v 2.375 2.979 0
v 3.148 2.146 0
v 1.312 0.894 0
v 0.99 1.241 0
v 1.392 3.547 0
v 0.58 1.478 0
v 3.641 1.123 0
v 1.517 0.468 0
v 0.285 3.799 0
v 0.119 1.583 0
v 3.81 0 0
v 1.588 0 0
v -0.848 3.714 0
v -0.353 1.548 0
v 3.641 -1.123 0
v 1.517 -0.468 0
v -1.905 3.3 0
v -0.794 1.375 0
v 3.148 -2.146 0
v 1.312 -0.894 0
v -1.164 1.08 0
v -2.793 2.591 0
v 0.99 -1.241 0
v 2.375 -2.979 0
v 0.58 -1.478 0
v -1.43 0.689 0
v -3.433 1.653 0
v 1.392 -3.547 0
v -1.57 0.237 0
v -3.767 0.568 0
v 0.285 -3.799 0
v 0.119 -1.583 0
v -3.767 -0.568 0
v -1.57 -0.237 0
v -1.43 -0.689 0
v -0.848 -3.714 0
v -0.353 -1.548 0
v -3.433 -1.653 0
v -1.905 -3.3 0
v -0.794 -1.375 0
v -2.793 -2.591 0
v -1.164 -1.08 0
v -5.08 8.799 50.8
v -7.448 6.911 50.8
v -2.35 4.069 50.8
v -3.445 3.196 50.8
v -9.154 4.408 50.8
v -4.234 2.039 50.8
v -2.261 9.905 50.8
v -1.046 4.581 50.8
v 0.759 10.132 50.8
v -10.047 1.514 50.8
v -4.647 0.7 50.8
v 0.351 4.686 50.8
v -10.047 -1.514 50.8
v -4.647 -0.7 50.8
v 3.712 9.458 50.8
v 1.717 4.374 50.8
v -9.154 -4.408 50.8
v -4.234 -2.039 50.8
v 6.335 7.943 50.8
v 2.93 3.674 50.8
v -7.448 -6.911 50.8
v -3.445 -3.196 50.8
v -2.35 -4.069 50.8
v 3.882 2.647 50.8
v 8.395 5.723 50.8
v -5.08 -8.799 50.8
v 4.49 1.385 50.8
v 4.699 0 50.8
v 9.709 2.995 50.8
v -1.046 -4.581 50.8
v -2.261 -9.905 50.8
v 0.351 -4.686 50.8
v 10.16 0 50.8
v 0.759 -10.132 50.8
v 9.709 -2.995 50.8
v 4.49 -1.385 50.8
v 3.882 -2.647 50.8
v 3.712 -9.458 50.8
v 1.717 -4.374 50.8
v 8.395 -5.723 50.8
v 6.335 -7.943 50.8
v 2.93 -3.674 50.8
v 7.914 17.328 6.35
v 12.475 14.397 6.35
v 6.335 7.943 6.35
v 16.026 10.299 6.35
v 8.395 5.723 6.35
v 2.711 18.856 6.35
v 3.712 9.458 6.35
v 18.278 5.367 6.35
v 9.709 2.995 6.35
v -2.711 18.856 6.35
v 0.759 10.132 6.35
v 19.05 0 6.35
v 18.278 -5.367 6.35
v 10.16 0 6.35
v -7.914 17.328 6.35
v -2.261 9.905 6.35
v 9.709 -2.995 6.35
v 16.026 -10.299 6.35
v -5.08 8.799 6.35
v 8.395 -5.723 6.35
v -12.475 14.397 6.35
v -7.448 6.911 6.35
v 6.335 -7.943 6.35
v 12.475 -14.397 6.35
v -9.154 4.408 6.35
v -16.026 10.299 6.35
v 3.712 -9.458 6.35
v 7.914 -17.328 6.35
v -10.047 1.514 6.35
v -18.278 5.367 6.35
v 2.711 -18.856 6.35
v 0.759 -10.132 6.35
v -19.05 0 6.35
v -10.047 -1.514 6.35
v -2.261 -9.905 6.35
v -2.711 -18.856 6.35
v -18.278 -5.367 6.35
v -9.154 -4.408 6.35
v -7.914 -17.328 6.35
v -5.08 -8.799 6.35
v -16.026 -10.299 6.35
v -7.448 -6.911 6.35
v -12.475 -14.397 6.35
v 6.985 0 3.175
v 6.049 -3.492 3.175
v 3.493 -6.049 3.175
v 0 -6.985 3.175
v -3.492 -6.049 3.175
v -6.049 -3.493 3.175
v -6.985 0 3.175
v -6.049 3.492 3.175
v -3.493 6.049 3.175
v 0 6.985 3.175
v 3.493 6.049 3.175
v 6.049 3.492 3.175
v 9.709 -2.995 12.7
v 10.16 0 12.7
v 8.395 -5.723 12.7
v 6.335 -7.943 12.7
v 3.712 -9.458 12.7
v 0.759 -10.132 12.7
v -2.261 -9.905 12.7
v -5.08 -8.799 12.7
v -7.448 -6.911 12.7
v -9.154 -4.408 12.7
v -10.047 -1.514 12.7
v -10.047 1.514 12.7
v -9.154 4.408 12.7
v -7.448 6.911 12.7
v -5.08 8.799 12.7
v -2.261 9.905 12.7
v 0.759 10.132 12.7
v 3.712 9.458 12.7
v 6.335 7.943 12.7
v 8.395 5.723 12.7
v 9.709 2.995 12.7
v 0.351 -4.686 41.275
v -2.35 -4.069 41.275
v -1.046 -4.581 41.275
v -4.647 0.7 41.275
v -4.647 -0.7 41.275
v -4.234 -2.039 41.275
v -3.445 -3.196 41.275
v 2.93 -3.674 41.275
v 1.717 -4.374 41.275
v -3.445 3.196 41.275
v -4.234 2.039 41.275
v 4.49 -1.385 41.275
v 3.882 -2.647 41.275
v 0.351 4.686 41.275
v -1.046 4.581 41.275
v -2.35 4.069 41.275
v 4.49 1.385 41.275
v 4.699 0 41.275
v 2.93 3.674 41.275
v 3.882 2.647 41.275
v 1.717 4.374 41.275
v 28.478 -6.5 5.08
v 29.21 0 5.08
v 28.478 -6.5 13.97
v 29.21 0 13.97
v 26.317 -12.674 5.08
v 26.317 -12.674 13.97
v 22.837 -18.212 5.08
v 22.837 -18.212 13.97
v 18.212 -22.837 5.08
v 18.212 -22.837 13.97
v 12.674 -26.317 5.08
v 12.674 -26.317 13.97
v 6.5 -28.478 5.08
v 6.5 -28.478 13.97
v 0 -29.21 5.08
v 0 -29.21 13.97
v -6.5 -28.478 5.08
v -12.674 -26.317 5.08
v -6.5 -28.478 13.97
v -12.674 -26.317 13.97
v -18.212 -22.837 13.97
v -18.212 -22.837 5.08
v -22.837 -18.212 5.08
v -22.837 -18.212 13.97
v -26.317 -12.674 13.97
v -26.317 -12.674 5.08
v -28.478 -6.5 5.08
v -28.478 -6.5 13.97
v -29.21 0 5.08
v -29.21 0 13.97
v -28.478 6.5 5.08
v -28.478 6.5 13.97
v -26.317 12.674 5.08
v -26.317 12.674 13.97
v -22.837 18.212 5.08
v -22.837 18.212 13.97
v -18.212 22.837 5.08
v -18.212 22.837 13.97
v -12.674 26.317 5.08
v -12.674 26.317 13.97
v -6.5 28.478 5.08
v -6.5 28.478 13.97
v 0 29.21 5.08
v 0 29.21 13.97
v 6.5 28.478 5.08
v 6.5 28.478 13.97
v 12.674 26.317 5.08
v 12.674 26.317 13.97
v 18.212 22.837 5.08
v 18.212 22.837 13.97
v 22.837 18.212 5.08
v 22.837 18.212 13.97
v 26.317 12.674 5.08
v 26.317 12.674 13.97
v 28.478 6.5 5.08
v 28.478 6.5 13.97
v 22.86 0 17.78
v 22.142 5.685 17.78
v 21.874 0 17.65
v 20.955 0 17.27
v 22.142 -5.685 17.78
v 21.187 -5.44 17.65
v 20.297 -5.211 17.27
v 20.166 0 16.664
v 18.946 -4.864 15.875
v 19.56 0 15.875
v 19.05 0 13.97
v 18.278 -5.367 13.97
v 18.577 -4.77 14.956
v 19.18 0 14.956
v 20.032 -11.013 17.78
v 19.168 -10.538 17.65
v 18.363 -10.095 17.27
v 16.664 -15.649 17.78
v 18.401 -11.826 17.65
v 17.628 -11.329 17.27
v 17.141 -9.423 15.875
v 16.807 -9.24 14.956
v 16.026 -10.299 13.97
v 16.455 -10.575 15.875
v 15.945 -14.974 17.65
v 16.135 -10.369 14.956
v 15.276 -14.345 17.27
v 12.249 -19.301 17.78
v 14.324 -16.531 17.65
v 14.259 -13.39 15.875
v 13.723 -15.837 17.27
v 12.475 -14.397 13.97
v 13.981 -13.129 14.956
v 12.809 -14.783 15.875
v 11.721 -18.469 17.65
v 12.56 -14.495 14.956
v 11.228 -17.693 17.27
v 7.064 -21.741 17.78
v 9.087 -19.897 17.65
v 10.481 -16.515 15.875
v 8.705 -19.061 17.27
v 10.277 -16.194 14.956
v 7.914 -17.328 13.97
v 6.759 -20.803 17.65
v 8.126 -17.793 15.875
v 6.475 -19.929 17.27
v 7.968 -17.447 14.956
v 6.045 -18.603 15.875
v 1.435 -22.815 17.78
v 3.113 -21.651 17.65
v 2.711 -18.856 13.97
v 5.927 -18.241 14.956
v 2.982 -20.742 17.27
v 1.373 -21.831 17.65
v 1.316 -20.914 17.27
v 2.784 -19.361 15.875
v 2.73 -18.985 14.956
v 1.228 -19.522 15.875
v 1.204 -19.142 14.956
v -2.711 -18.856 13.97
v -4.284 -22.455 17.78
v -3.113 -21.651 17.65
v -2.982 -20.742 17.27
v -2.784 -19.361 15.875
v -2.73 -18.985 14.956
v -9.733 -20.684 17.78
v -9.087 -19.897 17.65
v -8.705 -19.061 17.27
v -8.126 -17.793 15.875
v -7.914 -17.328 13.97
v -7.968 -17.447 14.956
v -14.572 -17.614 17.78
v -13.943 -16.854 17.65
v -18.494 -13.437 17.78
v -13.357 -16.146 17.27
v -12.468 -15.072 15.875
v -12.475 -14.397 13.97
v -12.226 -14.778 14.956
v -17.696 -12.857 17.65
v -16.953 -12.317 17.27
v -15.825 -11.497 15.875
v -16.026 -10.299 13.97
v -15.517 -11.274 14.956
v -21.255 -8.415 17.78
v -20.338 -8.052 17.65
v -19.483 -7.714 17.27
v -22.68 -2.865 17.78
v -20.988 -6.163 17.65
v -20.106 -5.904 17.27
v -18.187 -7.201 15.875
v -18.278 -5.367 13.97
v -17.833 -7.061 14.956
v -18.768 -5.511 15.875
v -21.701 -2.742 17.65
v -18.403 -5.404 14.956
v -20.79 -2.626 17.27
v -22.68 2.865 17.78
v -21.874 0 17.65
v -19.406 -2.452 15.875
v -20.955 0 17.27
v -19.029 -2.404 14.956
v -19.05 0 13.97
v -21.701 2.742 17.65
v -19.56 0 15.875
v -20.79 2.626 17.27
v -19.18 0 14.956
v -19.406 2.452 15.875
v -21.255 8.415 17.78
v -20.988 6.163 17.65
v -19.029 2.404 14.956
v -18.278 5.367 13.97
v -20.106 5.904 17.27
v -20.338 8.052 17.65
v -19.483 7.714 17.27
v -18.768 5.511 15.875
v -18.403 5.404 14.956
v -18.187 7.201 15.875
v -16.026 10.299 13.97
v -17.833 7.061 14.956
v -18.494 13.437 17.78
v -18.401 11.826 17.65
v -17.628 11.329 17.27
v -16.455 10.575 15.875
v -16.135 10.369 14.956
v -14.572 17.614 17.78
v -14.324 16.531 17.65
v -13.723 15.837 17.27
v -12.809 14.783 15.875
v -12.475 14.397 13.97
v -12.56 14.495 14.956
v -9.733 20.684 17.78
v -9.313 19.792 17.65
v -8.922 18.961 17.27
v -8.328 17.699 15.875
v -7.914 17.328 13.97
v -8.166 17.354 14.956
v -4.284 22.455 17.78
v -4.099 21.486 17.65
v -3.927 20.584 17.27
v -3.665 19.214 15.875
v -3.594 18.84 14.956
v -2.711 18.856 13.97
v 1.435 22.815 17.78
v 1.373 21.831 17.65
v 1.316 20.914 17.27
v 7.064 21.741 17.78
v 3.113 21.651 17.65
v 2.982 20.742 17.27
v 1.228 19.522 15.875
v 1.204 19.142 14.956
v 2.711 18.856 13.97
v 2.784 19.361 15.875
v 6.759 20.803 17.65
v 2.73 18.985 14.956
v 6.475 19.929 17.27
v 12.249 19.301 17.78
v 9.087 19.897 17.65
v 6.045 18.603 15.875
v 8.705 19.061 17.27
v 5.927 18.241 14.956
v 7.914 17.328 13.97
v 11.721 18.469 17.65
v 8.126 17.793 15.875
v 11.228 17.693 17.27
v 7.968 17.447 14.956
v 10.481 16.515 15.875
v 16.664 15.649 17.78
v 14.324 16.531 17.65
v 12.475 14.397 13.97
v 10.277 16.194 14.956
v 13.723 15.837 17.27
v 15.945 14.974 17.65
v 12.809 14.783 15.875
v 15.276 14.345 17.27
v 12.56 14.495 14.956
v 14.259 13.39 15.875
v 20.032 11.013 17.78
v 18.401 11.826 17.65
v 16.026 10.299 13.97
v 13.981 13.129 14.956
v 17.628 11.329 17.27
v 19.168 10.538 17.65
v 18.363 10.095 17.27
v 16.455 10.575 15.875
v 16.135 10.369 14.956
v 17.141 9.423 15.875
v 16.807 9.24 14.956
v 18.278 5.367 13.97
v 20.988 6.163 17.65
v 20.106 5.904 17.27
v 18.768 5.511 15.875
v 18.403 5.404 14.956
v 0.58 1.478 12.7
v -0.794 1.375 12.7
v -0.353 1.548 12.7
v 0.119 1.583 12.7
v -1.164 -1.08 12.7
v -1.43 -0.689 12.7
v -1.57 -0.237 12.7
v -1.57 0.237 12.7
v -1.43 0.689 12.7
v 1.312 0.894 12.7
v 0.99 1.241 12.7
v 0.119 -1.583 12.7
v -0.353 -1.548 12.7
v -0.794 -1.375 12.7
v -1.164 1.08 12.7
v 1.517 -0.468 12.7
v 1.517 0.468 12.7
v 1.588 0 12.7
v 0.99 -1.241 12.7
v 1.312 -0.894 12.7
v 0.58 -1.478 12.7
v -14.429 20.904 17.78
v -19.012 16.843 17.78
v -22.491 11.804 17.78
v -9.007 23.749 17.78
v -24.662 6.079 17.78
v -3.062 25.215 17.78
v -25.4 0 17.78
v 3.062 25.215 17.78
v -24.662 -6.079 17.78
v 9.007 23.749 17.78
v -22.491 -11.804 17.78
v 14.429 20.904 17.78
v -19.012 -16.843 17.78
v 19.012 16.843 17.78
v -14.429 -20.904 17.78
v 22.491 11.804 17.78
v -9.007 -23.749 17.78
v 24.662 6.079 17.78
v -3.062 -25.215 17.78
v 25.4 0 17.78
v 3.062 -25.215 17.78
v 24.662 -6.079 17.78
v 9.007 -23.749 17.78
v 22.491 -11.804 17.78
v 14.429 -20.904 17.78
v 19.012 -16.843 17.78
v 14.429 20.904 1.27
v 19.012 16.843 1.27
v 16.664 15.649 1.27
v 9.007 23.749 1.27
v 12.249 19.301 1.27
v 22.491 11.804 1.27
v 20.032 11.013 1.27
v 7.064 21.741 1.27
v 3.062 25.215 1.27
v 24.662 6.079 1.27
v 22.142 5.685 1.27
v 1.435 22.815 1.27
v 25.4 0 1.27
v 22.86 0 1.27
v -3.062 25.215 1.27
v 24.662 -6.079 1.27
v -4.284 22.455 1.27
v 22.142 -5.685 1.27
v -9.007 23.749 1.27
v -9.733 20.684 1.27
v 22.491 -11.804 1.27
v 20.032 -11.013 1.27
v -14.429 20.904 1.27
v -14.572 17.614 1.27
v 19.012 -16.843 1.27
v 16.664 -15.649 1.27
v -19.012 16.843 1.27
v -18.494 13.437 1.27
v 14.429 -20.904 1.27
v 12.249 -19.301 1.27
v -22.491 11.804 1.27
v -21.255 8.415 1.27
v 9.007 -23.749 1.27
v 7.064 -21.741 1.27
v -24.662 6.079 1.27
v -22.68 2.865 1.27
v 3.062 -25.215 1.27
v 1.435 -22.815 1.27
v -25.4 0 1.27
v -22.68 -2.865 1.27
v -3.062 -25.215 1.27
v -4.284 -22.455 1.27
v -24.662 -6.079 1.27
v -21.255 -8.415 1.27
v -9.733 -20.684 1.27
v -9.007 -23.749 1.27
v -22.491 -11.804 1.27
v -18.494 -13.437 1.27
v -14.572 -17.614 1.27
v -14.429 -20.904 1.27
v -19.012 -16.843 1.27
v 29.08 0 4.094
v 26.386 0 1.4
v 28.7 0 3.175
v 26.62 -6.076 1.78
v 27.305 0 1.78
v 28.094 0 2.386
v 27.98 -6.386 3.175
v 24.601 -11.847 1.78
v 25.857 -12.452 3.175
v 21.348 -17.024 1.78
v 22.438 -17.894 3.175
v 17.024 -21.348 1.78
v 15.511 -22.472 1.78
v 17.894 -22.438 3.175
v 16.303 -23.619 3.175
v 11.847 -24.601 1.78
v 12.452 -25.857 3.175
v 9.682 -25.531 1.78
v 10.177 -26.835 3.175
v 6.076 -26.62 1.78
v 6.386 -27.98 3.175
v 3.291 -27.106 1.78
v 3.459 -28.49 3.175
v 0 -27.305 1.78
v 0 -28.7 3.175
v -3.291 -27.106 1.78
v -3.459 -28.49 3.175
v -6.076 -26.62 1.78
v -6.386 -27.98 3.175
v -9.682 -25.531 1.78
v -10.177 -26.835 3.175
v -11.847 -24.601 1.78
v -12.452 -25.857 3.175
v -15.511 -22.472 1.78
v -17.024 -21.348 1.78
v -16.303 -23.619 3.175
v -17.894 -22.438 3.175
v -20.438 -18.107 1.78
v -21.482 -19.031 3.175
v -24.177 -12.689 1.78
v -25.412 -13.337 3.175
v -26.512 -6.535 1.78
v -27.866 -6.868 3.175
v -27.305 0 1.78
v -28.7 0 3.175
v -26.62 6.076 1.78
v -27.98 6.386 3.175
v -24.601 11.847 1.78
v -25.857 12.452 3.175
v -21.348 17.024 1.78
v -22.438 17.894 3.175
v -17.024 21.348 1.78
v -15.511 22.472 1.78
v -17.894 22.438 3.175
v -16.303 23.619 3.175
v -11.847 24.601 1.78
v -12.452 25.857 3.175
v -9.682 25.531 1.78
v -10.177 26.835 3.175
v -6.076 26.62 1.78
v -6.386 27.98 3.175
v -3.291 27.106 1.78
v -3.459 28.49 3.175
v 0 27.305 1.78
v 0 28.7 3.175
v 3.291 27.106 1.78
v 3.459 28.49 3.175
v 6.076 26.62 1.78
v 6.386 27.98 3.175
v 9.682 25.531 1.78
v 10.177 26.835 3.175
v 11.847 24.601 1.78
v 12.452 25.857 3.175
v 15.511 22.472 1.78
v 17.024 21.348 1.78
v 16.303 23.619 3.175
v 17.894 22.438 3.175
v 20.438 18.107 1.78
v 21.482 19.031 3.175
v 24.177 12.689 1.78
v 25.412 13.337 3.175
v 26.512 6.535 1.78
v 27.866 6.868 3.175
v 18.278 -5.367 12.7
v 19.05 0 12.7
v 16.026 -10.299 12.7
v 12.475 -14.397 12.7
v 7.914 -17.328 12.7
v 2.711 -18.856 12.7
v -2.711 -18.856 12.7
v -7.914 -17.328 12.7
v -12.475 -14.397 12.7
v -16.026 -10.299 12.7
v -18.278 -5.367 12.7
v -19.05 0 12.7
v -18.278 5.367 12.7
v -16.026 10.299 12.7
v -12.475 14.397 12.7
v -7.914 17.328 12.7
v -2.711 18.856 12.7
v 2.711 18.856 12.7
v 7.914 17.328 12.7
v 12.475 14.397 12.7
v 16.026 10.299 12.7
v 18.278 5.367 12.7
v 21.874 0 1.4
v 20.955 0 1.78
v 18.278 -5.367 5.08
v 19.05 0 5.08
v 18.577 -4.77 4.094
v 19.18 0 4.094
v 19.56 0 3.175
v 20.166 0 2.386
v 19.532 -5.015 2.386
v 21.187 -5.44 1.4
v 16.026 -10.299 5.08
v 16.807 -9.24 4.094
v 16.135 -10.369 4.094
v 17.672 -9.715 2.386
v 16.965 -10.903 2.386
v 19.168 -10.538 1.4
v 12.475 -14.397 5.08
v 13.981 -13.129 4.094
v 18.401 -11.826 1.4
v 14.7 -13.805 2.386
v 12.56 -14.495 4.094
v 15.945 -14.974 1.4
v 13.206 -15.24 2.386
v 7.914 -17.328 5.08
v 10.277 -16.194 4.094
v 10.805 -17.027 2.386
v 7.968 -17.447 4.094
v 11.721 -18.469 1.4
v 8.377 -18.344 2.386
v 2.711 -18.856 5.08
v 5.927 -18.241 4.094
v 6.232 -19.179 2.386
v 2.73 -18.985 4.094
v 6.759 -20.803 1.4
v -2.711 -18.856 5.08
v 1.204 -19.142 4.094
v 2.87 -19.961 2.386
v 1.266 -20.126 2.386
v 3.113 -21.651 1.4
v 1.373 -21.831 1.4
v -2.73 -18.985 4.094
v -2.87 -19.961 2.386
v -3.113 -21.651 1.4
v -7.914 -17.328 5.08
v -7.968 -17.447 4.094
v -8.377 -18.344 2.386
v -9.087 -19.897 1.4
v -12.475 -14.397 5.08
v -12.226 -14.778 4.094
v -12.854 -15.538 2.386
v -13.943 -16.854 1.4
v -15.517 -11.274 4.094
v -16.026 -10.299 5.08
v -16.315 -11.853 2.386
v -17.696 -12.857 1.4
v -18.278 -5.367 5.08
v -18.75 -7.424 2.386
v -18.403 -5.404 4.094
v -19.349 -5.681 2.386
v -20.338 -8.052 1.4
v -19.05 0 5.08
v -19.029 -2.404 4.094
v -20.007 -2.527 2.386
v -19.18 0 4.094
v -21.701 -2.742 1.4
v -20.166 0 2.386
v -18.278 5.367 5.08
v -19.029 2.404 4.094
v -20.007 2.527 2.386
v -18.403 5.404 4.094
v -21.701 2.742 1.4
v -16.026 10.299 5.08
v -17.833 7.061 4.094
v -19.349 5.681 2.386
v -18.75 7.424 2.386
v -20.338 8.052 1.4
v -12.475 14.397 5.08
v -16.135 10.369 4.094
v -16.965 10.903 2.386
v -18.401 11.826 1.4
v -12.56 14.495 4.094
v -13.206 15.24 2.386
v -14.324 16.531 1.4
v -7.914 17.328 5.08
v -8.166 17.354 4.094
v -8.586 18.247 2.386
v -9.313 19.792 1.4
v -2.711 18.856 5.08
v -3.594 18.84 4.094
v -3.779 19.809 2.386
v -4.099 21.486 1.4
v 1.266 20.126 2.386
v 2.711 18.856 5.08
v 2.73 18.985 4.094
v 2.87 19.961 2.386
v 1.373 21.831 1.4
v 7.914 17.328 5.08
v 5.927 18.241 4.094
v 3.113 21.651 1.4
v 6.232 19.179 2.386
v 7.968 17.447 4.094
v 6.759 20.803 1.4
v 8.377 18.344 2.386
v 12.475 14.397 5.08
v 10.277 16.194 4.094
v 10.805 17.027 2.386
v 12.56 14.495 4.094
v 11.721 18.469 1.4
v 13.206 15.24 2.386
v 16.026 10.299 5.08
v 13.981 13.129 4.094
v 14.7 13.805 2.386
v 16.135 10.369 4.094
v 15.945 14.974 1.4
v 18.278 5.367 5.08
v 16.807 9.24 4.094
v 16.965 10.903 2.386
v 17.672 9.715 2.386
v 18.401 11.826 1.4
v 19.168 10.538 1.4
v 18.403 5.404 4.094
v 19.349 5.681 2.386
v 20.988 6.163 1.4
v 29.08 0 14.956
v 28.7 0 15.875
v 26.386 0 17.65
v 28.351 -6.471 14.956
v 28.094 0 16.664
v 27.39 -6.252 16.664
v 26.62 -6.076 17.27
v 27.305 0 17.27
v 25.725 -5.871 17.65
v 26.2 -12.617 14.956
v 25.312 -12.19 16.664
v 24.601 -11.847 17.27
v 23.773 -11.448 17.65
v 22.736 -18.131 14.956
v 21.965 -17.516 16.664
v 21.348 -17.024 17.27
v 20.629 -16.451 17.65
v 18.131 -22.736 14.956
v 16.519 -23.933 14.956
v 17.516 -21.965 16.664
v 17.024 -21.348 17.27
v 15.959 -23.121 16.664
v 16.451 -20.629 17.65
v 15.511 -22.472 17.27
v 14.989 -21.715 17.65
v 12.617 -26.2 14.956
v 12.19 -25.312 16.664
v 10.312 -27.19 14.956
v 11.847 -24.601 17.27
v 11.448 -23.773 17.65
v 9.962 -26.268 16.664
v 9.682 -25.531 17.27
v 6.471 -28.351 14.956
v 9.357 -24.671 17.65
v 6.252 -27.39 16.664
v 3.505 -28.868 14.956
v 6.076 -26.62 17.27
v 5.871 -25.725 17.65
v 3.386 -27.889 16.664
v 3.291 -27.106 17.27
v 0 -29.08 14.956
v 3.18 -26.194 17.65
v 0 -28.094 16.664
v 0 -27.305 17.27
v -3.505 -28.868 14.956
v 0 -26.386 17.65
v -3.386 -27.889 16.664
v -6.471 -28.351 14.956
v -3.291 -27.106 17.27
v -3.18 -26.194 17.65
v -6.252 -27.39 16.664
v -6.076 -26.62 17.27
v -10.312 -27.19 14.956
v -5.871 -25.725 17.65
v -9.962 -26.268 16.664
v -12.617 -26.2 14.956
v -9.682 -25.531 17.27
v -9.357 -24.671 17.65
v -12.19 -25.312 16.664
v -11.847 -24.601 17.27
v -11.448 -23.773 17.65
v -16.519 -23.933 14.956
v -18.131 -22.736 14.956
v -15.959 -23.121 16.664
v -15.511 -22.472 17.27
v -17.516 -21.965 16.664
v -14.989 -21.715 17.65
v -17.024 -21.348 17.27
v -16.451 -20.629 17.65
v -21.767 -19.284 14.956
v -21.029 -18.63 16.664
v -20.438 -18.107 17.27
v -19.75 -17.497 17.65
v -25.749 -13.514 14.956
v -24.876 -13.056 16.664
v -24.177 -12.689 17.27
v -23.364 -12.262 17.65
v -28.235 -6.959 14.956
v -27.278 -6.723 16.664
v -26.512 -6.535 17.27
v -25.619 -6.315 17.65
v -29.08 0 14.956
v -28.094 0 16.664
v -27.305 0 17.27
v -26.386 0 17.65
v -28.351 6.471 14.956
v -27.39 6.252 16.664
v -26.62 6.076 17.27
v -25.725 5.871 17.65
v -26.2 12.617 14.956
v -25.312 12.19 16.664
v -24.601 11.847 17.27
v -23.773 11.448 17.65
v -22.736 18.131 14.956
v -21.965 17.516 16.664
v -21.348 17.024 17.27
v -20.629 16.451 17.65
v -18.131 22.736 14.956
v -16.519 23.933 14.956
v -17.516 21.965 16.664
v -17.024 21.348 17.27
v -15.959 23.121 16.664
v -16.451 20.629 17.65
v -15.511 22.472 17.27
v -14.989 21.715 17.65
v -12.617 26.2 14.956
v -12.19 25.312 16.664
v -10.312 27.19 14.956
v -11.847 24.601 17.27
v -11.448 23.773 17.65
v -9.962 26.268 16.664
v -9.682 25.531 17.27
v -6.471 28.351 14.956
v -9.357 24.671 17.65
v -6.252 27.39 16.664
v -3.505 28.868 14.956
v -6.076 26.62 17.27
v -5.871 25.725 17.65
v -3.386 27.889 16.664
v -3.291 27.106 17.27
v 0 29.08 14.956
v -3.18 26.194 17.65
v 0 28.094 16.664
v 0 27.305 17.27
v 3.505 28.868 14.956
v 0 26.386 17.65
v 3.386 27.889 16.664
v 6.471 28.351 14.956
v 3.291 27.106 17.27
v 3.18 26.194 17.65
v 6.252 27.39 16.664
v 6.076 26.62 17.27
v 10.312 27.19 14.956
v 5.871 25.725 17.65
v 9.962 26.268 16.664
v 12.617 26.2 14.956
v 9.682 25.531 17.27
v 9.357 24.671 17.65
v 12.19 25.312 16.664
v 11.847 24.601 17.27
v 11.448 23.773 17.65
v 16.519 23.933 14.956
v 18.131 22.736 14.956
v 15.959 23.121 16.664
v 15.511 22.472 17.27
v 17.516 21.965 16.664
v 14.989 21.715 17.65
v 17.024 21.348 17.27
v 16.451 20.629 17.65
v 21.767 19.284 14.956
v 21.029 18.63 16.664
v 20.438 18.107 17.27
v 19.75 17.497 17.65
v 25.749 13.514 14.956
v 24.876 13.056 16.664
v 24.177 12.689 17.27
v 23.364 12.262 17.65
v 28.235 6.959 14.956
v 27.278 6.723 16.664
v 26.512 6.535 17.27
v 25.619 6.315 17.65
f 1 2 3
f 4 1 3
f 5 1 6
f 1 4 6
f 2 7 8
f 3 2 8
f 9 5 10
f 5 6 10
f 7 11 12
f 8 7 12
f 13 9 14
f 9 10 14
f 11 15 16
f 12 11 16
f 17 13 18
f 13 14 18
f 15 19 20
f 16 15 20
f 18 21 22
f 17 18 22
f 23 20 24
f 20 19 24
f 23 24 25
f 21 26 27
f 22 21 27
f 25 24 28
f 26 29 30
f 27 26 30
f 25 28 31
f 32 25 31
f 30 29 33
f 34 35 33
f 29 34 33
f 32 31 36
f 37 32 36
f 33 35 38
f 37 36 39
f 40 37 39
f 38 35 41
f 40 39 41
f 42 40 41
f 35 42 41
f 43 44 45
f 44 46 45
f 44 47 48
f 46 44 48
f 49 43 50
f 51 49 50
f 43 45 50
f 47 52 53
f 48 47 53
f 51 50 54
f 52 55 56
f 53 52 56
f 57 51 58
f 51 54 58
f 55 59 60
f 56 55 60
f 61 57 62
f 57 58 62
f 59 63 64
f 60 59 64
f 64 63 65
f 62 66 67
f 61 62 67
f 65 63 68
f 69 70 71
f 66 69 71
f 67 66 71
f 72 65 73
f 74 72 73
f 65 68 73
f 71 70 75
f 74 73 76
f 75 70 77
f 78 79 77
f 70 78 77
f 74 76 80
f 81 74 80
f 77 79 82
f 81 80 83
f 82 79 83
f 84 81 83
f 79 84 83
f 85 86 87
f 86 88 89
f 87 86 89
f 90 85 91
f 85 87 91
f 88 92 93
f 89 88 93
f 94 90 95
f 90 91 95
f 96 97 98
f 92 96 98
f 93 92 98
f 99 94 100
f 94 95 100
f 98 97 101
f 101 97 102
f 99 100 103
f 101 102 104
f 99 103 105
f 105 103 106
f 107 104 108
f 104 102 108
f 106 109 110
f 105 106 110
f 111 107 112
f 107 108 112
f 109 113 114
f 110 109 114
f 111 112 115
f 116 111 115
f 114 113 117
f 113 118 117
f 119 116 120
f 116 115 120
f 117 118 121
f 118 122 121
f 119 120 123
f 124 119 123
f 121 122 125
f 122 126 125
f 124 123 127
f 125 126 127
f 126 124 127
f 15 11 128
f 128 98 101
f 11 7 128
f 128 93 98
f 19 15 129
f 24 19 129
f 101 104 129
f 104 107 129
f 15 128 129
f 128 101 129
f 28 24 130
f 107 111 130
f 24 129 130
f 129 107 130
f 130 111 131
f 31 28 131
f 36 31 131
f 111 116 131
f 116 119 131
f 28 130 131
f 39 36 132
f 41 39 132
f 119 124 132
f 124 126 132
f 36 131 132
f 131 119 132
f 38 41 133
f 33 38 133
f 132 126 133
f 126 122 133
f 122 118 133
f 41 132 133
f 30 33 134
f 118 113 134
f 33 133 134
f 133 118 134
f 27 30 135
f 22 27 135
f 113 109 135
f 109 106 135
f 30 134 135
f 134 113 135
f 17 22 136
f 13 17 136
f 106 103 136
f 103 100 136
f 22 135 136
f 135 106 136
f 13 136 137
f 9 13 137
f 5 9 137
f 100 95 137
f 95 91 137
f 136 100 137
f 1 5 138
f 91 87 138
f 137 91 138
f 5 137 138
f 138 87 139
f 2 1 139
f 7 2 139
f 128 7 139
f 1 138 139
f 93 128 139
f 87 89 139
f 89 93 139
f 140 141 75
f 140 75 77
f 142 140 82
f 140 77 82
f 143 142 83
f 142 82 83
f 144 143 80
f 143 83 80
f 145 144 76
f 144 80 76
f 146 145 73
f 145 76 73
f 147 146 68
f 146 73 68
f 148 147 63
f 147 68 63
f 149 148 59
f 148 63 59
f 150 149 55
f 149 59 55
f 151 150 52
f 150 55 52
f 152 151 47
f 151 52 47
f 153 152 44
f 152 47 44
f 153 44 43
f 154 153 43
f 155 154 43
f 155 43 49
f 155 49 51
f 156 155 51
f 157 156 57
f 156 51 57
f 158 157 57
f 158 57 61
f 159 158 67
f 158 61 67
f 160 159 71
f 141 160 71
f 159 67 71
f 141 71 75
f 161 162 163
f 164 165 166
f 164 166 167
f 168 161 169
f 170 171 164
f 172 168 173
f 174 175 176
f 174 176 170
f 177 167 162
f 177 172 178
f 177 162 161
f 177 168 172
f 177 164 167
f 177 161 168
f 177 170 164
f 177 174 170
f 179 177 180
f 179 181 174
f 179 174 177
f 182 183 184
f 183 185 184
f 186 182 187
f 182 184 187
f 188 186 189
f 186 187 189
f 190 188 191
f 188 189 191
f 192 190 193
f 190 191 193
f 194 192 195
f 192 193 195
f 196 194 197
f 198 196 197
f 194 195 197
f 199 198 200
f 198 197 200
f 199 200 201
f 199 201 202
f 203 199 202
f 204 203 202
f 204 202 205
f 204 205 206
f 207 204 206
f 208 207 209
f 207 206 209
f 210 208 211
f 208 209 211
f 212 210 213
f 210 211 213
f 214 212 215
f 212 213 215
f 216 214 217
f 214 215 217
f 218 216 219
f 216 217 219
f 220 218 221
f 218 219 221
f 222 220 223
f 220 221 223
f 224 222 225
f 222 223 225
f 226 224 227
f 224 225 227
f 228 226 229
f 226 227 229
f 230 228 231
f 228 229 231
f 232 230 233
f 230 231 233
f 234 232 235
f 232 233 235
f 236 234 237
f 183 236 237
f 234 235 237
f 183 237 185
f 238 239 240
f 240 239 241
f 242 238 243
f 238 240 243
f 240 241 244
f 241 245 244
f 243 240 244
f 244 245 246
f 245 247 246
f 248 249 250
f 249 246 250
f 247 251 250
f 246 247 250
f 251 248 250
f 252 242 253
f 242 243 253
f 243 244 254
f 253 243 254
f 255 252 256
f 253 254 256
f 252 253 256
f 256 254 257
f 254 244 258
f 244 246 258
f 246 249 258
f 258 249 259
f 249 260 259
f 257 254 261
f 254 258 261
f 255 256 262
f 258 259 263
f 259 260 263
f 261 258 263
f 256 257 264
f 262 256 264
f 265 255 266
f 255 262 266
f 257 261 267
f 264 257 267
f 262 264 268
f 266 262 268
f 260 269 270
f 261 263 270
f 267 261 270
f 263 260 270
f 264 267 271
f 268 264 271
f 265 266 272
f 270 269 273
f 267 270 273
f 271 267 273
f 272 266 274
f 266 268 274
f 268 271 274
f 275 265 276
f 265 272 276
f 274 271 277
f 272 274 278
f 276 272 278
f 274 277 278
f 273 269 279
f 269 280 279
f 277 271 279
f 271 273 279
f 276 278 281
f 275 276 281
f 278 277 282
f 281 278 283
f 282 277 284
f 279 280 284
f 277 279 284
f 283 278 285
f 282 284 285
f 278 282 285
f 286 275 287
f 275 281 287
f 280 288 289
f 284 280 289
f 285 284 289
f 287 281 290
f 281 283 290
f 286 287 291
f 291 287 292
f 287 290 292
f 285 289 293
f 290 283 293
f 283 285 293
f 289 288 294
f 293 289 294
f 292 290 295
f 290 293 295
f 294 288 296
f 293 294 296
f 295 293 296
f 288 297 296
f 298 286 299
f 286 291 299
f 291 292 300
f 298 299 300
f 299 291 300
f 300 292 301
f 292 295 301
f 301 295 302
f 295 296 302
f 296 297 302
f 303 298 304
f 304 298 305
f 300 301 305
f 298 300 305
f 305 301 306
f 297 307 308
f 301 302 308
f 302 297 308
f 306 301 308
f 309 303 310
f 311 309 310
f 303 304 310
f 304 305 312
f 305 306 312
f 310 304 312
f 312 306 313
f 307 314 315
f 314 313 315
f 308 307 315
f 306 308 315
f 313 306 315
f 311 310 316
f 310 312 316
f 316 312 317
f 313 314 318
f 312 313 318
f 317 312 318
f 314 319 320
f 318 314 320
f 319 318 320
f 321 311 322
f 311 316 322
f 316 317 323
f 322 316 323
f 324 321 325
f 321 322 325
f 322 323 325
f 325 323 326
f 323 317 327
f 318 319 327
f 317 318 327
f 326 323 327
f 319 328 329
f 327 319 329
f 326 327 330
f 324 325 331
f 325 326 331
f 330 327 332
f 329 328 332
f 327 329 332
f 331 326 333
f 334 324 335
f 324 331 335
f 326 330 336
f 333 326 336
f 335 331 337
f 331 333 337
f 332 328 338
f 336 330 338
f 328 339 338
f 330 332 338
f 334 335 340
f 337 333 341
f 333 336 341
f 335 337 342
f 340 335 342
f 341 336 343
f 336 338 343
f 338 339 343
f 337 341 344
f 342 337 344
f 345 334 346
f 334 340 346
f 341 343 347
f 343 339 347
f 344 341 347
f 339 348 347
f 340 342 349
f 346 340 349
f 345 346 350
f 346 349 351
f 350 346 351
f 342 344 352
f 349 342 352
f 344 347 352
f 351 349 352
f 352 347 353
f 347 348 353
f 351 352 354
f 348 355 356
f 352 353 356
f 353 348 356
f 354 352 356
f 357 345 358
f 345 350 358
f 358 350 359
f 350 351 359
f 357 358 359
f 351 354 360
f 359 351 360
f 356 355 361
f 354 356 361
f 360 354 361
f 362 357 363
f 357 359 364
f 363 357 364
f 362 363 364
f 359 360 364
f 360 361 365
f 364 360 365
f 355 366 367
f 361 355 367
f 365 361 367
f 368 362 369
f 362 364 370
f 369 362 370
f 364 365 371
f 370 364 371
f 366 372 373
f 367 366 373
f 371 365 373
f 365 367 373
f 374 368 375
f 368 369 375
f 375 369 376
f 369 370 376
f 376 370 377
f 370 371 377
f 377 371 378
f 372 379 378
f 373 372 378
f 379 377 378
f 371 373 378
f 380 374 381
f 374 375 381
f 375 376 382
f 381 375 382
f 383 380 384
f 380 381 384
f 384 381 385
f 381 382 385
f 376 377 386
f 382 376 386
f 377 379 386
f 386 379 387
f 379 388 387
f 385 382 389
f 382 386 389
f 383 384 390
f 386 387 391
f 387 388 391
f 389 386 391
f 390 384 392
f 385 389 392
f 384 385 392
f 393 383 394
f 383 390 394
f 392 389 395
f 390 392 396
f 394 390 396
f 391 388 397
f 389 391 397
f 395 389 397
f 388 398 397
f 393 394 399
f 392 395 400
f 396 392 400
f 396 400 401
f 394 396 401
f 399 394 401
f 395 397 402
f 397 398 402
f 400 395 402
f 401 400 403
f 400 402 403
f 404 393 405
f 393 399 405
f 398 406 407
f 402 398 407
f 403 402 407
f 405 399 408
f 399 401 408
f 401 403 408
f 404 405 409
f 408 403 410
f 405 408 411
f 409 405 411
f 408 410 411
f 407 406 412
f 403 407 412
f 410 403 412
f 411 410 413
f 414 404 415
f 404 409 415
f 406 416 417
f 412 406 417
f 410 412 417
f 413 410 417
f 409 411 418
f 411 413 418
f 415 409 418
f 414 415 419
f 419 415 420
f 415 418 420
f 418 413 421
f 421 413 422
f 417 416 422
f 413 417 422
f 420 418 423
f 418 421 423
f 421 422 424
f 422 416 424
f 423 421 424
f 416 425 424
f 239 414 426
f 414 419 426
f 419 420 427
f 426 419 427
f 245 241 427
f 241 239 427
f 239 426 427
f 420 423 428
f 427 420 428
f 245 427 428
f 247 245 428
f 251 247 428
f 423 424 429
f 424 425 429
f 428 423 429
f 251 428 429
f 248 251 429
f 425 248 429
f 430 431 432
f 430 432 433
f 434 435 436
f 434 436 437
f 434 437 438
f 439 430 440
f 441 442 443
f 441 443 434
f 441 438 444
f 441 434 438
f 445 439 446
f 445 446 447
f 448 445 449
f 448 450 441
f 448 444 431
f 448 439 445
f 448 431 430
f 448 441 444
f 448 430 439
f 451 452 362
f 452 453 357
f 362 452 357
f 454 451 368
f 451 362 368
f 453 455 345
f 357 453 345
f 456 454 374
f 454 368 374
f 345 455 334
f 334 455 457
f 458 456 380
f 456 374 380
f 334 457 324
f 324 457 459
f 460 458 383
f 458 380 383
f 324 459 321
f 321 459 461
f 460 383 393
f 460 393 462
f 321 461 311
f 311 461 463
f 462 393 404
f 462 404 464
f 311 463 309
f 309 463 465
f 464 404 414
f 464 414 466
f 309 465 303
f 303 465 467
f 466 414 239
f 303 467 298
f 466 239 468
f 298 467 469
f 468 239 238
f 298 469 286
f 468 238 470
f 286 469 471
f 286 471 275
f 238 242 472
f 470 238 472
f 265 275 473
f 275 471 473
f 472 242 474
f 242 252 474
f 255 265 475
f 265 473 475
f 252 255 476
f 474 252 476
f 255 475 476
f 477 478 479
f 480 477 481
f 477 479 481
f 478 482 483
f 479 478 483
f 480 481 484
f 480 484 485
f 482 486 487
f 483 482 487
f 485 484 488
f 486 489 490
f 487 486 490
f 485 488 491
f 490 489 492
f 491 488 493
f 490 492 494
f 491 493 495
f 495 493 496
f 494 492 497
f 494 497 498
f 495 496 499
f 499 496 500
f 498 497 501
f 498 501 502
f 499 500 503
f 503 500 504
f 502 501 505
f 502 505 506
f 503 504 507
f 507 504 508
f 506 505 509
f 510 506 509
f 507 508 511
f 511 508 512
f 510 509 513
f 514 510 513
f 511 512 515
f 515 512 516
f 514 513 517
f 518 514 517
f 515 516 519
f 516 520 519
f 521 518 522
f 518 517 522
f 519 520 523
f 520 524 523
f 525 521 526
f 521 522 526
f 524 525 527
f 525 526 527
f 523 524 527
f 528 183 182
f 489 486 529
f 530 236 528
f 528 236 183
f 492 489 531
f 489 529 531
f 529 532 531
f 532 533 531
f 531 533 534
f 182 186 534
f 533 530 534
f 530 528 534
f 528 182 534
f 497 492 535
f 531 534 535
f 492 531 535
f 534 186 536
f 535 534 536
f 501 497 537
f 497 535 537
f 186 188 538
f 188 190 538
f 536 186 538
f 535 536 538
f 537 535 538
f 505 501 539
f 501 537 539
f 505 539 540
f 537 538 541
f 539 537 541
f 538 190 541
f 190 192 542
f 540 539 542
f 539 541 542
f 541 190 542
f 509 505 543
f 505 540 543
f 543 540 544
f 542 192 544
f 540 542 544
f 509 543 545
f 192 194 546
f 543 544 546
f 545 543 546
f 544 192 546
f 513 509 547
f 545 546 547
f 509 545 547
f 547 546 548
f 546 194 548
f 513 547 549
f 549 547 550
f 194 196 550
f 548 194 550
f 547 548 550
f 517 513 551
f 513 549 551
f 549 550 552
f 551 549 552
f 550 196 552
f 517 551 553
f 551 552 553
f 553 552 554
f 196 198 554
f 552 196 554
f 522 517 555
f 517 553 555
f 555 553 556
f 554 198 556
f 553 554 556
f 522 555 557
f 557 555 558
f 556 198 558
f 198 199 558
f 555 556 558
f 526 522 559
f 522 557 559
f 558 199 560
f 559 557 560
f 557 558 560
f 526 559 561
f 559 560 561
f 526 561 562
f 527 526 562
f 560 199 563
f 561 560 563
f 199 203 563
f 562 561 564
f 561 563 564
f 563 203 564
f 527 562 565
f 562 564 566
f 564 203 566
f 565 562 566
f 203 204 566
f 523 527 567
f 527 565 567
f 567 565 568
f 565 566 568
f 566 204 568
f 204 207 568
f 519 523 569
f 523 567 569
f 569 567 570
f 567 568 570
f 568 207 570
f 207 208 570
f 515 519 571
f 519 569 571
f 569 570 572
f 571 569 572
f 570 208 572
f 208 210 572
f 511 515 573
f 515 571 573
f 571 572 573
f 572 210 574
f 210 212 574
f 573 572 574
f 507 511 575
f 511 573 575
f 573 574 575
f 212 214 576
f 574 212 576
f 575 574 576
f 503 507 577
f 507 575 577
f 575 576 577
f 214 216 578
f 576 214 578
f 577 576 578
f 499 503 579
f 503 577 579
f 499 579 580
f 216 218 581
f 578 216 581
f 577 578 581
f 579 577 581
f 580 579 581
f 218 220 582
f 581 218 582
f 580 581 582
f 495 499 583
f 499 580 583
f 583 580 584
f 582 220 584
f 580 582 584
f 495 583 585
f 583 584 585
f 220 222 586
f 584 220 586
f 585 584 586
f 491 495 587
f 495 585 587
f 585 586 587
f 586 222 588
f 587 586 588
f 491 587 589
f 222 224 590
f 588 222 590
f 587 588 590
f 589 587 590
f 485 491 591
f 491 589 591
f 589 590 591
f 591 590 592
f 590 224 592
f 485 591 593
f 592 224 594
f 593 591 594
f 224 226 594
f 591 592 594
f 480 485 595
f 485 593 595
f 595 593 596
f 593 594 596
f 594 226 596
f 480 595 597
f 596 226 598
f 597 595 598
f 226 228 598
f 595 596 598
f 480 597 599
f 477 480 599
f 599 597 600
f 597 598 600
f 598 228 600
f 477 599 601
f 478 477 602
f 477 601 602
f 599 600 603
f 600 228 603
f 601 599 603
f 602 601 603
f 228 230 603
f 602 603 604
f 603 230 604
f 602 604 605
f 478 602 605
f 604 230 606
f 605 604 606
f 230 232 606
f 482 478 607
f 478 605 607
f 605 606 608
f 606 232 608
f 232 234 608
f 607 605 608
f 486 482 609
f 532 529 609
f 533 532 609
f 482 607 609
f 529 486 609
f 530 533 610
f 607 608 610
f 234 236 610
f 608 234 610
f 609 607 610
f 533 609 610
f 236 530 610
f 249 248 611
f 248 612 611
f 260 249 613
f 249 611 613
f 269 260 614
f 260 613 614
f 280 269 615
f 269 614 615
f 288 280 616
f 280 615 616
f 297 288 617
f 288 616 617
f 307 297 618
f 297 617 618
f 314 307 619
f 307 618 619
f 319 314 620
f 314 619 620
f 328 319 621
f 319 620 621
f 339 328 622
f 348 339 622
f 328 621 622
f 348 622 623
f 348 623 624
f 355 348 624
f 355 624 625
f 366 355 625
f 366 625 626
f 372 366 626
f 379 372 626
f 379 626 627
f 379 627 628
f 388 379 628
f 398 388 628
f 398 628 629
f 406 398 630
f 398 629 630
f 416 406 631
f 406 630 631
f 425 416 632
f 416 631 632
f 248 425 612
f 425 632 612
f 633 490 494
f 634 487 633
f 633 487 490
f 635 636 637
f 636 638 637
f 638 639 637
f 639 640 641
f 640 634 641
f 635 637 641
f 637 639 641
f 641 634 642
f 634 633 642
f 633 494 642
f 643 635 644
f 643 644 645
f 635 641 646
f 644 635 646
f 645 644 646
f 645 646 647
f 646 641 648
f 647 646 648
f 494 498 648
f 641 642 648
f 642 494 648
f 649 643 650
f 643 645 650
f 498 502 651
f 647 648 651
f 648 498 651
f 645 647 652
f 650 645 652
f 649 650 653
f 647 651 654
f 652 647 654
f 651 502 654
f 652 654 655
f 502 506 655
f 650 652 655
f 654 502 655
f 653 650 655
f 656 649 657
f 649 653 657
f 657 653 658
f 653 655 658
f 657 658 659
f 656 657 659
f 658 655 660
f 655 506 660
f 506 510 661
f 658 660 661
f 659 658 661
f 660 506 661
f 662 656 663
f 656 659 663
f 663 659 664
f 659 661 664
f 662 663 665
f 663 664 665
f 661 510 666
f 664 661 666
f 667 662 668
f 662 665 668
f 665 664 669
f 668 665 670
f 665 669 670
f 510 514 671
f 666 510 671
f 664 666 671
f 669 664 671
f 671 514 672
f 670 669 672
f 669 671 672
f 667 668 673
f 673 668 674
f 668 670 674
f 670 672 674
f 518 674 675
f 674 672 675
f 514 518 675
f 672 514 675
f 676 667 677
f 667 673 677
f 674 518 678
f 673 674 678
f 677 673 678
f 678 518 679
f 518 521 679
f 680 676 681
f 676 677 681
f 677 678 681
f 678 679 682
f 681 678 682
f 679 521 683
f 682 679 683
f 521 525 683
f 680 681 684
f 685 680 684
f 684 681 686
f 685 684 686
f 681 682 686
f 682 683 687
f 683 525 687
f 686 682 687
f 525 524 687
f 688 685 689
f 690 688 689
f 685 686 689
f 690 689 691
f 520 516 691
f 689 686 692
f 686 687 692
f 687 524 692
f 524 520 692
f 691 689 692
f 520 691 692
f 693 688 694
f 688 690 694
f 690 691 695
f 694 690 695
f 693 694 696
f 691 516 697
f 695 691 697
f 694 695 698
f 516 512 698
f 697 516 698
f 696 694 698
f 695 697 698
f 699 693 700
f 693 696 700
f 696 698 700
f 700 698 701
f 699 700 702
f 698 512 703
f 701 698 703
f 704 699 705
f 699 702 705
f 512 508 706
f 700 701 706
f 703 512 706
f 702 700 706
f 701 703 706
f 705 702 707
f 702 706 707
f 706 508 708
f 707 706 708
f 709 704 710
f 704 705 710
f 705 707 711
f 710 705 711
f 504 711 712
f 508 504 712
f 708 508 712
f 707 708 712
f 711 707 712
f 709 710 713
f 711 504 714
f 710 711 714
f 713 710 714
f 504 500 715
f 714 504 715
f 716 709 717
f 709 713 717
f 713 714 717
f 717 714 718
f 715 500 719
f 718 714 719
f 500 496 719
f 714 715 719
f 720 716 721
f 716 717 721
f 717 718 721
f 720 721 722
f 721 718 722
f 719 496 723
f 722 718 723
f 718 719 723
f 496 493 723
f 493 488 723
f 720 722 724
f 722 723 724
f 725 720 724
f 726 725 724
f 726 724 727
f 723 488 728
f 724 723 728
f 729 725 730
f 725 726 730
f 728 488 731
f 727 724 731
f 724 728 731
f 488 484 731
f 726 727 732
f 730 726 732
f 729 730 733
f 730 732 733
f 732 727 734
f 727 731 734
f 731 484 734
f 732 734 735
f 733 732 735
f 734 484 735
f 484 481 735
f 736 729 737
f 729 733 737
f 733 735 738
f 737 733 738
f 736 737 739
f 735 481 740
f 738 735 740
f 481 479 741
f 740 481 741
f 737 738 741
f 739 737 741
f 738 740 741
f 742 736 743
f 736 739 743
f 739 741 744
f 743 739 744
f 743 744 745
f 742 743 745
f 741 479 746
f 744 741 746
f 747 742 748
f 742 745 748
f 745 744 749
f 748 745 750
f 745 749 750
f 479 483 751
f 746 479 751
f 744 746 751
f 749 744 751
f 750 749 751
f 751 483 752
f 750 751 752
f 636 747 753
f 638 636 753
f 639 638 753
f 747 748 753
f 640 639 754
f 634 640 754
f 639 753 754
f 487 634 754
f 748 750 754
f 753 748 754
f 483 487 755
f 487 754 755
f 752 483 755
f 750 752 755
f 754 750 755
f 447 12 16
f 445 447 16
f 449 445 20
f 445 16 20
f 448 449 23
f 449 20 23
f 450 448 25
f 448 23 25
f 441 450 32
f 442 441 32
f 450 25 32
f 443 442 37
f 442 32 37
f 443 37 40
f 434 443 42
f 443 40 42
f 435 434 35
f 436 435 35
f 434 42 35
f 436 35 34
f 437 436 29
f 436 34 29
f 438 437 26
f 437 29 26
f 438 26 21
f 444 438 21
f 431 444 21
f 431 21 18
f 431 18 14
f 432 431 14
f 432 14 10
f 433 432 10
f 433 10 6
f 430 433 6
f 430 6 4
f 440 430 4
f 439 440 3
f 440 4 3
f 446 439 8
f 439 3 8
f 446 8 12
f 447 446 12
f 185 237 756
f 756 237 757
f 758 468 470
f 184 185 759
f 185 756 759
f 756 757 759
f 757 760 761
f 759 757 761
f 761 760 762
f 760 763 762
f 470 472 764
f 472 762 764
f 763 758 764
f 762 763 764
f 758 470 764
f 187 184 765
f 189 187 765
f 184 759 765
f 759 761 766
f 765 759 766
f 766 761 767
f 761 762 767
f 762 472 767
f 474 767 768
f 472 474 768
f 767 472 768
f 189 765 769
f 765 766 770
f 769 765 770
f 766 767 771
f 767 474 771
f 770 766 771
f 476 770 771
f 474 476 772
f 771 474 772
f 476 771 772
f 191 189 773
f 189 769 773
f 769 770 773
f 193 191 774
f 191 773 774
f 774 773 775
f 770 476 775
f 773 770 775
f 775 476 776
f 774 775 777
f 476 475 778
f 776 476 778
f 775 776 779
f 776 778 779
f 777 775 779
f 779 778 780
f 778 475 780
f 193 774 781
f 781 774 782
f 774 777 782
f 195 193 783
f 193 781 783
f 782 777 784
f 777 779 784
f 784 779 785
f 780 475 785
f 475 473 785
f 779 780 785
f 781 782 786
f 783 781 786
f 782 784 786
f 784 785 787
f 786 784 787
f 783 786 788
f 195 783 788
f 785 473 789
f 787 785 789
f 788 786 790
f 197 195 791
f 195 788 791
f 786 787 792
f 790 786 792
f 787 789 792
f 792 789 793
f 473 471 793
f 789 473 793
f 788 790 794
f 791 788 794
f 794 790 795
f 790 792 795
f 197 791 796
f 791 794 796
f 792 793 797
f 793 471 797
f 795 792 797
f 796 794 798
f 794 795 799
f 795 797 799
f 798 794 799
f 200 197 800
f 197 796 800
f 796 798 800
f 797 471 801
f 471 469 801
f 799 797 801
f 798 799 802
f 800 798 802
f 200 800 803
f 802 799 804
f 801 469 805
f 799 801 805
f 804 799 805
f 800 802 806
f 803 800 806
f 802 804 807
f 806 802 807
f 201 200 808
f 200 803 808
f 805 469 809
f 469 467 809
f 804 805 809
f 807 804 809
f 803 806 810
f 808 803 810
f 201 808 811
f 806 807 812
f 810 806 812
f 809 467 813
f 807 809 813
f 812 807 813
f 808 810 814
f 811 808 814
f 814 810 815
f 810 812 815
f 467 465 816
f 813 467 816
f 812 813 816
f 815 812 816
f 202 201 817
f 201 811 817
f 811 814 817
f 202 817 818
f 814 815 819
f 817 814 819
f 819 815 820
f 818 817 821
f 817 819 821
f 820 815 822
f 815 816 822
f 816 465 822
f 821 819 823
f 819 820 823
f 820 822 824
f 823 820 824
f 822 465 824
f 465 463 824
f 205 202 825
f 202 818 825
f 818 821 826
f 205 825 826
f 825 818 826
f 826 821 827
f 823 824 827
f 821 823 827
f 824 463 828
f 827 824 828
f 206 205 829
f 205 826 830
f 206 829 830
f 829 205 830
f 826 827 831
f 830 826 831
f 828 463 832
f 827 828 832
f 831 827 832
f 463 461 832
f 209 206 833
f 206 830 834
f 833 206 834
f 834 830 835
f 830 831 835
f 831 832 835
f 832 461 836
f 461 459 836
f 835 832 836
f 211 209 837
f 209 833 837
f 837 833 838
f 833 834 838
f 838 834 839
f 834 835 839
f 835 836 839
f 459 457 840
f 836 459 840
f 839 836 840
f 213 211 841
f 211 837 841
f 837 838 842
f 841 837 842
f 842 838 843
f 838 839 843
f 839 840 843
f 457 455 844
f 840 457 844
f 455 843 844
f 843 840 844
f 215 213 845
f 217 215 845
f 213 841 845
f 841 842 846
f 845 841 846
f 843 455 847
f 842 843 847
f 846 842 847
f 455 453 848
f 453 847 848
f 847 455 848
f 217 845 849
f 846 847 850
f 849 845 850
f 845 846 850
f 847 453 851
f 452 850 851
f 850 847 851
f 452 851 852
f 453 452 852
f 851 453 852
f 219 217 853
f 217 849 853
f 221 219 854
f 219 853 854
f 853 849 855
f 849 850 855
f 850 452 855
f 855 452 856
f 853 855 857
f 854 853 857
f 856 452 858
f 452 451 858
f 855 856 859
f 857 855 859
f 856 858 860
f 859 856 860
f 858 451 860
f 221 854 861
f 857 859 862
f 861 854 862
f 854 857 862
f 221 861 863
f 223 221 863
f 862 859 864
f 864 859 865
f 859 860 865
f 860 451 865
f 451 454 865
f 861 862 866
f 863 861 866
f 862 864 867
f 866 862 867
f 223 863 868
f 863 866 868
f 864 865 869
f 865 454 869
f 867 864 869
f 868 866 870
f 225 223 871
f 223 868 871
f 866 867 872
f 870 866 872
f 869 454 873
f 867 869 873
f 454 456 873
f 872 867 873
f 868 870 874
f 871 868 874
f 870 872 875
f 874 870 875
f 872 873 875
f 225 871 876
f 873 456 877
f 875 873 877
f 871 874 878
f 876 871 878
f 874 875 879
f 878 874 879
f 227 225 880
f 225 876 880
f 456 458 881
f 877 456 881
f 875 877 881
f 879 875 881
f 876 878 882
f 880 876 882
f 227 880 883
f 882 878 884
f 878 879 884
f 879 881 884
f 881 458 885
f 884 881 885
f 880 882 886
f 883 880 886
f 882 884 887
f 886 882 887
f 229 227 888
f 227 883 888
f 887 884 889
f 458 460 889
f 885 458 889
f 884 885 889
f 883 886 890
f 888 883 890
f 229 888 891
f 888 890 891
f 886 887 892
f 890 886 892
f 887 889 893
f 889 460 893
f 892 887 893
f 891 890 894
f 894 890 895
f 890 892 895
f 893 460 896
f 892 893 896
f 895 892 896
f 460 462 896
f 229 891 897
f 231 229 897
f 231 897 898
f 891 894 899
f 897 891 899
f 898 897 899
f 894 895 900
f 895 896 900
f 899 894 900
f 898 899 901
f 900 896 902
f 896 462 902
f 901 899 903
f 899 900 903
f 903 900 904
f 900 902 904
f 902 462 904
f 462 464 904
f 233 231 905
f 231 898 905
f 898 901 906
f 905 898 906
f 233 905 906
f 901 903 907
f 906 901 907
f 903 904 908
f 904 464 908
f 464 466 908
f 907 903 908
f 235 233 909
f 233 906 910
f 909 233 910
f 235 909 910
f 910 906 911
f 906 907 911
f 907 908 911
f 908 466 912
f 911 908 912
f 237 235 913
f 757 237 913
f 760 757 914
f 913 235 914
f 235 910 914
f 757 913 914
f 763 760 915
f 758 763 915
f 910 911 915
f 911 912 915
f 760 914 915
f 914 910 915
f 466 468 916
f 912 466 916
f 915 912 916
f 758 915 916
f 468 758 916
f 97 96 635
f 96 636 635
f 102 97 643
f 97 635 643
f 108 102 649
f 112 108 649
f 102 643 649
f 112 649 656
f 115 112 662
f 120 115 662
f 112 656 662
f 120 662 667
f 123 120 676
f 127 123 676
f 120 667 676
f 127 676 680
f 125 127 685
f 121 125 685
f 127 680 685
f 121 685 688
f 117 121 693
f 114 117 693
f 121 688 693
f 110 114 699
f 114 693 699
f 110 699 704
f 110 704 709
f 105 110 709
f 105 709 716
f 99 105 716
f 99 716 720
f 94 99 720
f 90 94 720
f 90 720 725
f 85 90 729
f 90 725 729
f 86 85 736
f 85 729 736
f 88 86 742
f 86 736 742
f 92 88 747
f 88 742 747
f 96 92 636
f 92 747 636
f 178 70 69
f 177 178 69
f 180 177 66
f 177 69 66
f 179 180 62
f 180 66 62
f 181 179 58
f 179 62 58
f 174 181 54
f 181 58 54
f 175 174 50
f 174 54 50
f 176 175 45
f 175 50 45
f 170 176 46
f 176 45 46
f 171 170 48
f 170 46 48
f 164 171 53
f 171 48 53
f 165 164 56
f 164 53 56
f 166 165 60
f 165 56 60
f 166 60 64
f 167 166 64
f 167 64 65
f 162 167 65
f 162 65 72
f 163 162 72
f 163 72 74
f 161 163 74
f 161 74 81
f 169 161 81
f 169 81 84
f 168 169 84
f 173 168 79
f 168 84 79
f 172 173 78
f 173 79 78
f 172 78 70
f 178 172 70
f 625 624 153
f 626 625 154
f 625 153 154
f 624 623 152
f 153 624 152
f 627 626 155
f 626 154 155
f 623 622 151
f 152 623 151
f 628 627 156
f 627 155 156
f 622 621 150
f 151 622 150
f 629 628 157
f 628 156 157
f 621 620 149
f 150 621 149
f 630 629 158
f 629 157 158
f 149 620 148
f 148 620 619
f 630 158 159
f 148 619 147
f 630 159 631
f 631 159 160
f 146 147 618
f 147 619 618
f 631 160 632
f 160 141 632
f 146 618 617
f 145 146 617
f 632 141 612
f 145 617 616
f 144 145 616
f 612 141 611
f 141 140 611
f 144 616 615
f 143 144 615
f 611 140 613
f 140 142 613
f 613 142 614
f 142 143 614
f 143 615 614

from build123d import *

# Parameters (mm, degrees)
F2_R     = 4.699
F3_DEPTH = 9.525
F4_R     = 1.5875
F5_DEPTH = 12.7


with BuildPart() as f1:
    # F0 (on Front) → F1 (revolve)
    with BuildSketch(Plane.XZ):
        with BuildLine():
            Line((0, 50.8), (0, 0))
            Line((0, 0), (3.81, 0))
            Line((3.81, 0), (10.16, 6.35))
            Line((10.16, 6.35), (19.05, 6.35))
            Line((19.05, 6.35), (19.05, 5.08))
            ThreePointArc((19.05, 5.08), (20.165923, 2.385923), (22.86, 1.27))
            Line((22.86, 1.27), (25.4, 1.27))
            ThreePointArc((25.4, 1.27), (28.094077, 2.385923), (29.21, 5.08))
            Line((29.21, 5.08), (29.21, 13.97))
            ThreePointArc((29.21, 13.97), (28.094077, 16.664077), (25.4, 17.78))
            Line((25.4, 17.78), (22.86, 17.78))
            ThreePointArc((22.86, 17.78), (20.165923, 16.664077), (19.05, 13.97))
            Line((19.05, 13.97), (19.05, 12.7))
            Line((19.05, 12.7), (10.16, 12.7))
            Line((10.16, 12.7), (10.16, 50.8))
            Line((10.16, 50.8), (0, 50.8))
        make_face()
    revolve(axis=Axis((0, 0, 25.4), (0, 0, -1)))

    # F2 (on face) → F3 (cut)
    with BuildSketch(Plane.XY.offset(50.8)):
        Circle(F2_R)
    extrude(amount=-F3_DEPTH, mode=Mode.SUBTRACT)

    # F4 (on face) → F5 (cut)
    with BuildSketch(Plane(origin=(0, 0, 0), x_dir=(1, 0, 0), z_dir=(0, 0, -1))):
        Circle(F4_R)
    extrude(amount=-F5_DEPTH, mode=Mode.SUBTRACT)


solid = f1.part
